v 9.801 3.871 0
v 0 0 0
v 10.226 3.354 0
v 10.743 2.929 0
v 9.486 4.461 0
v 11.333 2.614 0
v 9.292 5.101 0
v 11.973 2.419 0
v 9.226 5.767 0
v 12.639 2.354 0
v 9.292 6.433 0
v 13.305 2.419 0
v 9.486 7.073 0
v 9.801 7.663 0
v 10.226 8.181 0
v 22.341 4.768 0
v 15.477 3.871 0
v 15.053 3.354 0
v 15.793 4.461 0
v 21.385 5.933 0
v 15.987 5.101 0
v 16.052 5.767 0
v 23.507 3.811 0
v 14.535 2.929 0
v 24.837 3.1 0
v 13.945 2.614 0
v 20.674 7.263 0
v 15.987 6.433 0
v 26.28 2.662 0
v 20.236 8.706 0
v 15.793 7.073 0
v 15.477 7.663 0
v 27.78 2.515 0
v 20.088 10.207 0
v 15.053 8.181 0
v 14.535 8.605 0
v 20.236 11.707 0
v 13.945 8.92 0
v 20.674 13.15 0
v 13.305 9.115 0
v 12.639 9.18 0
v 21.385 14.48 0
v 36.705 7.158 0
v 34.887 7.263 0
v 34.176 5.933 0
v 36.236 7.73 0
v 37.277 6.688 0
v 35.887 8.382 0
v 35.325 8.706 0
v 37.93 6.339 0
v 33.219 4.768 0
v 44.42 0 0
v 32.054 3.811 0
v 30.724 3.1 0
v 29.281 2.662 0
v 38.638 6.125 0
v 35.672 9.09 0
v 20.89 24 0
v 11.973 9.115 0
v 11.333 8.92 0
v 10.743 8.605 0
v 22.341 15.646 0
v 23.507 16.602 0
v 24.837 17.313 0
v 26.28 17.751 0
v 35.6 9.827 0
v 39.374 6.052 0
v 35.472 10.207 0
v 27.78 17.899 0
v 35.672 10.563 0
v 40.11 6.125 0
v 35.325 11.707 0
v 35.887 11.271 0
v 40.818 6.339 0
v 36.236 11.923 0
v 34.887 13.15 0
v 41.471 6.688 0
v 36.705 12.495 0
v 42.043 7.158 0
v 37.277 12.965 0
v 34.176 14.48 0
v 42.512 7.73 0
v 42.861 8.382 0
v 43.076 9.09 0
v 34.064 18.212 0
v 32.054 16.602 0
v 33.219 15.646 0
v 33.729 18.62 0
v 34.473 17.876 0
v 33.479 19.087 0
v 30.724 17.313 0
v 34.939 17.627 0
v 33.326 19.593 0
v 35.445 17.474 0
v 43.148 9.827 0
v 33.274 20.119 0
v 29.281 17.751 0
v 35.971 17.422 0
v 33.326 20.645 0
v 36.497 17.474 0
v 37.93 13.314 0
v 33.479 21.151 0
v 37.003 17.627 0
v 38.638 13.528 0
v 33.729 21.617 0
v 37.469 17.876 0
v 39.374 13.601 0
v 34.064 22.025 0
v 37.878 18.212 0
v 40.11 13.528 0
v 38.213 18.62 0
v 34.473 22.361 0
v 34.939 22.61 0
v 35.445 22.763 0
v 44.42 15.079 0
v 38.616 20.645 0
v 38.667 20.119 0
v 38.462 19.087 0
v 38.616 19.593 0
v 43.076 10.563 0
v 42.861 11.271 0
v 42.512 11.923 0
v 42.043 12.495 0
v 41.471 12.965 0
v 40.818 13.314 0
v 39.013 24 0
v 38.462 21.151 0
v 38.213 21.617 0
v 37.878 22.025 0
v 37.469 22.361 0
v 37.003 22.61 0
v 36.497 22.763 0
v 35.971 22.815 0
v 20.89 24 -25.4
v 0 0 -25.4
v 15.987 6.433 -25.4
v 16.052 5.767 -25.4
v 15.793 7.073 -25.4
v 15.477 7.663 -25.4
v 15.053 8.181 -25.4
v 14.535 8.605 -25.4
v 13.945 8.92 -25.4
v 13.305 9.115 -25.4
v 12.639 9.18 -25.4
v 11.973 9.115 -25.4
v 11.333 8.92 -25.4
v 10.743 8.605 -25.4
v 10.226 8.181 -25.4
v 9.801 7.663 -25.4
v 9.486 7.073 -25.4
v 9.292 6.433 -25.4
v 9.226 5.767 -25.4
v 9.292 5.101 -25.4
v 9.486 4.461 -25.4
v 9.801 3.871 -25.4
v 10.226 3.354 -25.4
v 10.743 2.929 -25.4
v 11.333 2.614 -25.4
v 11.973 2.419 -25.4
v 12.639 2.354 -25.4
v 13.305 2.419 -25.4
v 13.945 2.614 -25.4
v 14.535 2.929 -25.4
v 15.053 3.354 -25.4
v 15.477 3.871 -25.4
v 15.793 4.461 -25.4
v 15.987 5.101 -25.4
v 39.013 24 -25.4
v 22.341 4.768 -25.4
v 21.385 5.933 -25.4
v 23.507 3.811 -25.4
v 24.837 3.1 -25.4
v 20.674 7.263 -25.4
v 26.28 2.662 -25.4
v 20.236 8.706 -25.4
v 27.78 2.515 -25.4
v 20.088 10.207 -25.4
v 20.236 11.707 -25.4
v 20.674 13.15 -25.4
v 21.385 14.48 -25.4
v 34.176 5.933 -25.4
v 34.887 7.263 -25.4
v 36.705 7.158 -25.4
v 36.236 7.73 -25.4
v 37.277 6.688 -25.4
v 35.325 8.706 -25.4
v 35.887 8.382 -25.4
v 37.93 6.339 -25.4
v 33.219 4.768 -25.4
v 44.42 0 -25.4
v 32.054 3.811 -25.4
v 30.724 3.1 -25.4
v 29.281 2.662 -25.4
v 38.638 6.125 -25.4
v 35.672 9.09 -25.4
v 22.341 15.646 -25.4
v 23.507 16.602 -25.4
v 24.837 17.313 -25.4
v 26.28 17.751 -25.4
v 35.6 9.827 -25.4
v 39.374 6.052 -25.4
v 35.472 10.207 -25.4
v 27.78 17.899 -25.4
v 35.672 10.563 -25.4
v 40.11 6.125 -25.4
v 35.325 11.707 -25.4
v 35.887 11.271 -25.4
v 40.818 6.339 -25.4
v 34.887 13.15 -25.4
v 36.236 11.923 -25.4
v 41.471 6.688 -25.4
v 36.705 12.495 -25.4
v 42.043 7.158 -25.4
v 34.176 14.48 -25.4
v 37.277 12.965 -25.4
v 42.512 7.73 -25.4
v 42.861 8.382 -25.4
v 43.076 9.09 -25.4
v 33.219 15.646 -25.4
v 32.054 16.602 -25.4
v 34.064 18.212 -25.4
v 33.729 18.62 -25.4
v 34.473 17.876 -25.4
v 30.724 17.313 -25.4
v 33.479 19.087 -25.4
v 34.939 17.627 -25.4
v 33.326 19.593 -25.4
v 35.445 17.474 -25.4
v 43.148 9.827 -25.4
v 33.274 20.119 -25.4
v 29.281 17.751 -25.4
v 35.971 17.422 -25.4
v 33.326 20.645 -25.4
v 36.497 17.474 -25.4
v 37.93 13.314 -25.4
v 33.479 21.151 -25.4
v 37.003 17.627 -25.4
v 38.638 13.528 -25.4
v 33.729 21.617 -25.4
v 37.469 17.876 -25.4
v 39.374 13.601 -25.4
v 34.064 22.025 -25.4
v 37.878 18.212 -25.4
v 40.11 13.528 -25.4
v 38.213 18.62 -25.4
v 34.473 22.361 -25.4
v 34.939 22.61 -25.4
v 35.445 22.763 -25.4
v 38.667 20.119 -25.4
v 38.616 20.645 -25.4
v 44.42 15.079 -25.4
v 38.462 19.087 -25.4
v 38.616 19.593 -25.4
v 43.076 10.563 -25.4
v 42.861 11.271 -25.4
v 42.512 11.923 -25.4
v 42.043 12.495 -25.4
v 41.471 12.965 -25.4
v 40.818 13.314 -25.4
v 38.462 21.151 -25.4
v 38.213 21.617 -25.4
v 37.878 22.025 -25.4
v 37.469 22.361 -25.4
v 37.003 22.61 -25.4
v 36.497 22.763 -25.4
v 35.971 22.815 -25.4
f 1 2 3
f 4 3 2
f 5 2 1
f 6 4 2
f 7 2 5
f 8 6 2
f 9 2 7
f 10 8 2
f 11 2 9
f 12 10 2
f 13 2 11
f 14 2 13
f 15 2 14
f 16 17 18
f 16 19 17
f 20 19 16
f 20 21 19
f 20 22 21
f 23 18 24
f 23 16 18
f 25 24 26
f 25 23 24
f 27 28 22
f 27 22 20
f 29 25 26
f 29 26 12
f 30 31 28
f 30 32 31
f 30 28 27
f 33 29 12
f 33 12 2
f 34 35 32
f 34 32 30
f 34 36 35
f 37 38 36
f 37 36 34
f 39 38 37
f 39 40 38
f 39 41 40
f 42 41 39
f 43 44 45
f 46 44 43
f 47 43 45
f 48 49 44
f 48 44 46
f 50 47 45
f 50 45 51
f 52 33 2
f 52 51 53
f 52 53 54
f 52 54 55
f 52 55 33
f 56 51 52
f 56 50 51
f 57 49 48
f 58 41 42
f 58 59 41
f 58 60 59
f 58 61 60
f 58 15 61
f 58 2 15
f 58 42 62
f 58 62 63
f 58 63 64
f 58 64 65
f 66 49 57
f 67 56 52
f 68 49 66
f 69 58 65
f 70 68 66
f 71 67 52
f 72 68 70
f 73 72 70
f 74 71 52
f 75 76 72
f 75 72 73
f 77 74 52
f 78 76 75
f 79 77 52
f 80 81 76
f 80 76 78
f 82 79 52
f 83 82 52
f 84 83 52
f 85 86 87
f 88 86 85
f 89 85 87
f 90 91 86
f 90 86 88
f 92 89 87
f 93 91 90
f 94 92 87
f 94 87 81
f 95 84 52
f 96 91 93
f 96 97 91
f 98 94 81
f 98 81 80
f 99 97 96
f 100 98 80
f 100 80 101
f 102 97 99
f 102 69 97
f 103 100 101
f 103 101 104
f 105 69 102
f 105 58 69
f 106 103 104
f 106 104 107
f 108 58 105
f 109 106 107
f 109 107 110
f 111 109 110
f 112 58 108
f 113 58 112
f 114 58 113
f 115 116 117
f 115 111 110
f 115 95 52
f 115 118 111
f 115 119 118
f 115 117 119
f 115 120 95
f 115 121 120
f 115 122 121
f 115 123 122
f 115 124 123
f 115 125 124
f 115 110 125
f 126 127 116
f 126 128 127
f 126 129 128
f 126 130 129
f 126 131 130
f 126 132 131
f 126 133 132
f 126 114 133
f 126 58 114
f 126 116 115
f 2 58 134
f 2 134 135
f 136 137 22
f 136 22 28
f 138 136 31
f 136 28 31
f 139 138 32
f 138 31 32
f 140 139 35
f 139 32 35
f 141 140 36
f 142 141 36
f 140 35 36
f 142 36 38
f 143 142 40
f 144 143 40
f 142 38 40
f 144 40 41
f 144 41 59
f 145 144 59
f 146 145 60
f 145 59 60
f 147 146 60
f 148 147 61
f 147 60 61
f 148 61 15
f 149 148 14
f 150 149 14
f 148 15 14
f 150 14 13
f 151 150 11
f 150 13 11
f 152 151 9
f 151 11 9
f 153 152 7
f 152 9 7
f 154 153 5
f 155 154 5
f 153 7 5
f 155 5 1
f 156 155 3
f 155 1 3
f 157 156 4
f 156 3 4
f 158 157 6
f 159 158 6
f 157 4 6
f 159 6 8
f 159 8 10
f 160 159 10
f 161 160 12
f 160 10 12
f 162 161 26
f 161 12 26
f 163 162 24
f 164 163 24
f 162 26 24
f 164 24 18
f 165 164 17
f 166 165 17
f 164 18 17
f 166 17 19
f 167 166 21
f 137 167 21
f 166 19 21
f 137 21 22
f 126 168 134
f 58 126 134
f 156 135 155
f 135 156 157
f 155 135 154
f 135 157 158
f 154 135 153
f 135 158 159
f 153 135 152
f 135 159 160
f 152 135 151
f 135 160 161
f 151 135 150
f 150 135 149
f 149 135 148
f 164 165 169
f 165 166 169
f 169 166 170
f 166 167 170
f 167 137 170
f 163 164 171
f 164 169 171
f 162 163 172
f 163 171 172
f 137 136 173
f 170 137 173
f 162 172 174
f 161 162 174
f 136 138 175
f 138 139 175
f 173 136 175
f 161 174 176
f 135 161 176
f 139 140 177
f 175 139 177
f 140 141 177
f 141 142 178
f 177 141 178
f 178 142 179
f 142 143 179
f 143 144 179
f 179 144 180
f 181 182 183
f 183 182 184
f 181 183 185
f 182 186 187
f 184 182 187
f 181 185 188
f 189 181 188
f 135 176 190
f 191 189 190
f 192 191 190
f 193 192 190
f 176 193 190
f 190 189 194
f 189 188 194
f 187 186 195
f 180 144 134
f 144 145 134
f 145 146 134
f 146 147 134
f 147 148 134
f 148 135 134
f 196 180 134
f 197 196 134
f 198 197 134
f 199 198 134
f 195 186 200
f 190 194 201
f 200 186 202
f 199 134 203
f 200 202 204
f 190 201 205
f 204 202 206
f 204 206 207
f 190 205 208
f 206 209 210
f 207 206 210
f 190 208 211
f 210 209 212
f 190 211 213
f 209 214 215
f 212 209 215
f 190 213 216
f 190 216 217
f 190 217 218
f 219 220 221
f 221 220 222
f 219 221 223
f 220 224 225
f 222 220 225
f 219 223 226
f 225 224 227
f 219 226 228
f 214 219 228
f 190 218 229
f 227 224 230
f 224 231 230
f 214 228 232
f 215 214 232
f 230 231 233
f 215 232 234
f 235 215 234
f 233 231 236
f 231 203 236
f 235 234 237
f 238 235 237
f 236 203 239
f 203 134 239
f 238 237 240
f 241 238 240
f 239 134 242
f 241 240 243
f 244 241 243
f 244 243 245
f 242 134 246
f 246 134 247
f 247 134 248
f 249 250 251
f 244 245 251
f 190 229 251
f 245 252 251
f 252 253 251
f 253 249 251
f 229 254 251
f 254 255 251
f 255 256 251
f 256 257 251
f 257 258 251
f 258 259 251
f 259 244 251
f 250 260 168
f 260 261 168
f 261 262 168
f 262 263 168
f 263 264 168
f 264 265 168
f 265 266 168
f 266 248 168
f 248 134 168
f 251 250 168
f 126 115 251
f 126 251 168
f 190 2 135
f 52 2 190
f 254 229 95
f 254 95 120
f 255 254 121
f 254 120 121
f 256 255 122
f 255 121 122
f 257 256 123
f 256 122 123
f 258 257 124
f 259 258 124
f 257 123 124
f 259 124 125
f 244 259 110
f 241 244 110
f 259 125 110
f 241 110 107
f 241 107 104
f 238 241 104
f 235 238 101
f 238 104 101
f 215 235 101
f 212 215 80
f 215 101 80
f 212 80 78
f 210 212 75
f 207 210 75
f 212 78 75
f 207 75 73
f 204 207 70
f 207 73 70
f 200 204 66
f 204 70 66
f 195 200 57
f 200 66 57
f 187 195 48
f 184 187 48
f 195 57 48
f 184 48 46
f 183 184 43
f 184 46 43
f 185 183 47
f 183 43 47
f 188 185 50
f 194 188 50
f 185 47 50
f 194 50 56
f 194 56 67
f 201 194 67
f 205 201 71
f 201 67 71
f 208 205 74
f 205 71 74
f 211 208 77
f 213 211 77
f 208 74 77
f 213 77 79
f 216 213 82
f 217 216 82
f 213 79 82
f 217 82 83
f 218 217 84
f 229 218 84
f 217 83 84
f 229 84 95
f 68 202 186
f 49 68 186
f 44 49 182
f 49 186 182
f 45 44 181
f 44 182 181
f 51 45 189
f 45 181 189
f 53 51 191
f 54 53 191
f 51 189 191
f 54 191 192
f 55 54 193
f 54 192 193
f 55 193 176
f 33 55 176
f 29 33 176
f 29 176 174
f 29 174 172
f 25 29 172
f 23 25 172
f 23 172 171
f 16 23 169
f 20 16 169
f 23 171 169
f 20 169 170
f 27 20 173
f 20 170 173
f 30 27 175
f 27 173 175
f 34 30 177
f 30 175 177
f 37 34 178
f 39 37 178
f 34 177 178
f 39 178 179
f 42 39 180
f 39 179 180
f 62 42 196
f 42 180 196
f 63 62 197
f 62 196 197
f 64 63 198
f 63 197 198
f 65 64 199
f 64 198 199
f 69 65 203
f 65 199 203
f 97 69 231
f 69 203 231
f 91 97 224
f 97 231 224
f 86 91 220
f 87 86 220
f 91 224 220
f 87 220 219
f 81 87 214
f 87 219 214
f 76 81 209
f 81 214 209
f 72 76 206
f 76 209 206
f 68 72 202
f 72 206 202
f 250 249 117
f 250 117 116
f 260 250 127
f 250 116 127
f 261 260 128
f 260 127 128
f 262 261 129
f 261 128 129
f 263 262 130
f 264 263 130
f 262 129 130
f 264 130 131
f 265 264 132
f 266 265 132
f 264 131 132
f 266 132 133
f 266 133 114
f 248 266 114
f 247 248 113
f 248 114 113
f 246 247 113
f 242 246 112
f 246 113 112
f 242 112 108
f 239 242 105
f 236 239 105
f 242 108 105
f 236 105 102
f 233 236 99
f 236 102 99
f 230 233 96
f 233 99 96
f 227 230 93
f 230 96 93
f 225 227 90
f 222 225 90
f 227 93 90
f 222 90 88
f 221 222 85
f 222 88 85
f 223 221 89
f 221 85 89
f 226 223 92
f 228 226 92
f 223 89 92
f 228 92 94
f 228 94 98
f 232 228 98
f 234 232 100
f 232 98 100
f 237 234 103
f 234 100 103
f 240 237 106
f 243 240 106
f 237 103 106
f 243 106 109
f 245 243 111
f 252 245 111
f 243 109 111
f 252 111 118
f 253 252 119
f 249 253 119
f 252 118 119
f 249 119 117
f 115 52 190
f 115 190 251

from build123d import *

# Parameters (mm, degrees)
F1_DEPTH = 25.4
F2_R     = 7.692032
F3_DEPTH = 25.4
F5_R     = 2.696649
F5_R_2   = 3.774417
F5_R_3   = 3.413238
F6_DEPTH = 25.4


with BuildPart() as f1:
    # F0 (on Top) → F1 (new body)
    with BuildSketch(Plane.XY):
        Polygon((20.889619, 24.00038), (0, 0), (44.420268, 0), (44.420268, 15.078895), (39.012816, 24.00038), align=None)
    extrude(amount=-F1_DEPTH)

    # F2 (on face) → F3 (cut)
    with BuildSketch(Plane(origin=(0, 0, -25.4), x_dir=(1, 0, 0), z_dir=(0, 0, -1))):
        with Locations((27.78032, -10.206683)):
            Circle(F2_R)
    extrude(amount=-F3_DEPTH, mode=Mode.SUBTRACT)

    # F5 (on face) → F6 (cut)
    with BuildSketch(Plane.XY):
        with Locations((35.97071, 20.118631)):
            Circle(F5_R)
        with Locations((39.374083, 9.826504)):
            Circle(F5_R_2)
        with Locations((12.639156, 5.767059)):
            Circle(F5_R_3)
    extrude(amount=-F6_DEPTH, mode=Mode.SUBTRACT)


solid = f1.part
